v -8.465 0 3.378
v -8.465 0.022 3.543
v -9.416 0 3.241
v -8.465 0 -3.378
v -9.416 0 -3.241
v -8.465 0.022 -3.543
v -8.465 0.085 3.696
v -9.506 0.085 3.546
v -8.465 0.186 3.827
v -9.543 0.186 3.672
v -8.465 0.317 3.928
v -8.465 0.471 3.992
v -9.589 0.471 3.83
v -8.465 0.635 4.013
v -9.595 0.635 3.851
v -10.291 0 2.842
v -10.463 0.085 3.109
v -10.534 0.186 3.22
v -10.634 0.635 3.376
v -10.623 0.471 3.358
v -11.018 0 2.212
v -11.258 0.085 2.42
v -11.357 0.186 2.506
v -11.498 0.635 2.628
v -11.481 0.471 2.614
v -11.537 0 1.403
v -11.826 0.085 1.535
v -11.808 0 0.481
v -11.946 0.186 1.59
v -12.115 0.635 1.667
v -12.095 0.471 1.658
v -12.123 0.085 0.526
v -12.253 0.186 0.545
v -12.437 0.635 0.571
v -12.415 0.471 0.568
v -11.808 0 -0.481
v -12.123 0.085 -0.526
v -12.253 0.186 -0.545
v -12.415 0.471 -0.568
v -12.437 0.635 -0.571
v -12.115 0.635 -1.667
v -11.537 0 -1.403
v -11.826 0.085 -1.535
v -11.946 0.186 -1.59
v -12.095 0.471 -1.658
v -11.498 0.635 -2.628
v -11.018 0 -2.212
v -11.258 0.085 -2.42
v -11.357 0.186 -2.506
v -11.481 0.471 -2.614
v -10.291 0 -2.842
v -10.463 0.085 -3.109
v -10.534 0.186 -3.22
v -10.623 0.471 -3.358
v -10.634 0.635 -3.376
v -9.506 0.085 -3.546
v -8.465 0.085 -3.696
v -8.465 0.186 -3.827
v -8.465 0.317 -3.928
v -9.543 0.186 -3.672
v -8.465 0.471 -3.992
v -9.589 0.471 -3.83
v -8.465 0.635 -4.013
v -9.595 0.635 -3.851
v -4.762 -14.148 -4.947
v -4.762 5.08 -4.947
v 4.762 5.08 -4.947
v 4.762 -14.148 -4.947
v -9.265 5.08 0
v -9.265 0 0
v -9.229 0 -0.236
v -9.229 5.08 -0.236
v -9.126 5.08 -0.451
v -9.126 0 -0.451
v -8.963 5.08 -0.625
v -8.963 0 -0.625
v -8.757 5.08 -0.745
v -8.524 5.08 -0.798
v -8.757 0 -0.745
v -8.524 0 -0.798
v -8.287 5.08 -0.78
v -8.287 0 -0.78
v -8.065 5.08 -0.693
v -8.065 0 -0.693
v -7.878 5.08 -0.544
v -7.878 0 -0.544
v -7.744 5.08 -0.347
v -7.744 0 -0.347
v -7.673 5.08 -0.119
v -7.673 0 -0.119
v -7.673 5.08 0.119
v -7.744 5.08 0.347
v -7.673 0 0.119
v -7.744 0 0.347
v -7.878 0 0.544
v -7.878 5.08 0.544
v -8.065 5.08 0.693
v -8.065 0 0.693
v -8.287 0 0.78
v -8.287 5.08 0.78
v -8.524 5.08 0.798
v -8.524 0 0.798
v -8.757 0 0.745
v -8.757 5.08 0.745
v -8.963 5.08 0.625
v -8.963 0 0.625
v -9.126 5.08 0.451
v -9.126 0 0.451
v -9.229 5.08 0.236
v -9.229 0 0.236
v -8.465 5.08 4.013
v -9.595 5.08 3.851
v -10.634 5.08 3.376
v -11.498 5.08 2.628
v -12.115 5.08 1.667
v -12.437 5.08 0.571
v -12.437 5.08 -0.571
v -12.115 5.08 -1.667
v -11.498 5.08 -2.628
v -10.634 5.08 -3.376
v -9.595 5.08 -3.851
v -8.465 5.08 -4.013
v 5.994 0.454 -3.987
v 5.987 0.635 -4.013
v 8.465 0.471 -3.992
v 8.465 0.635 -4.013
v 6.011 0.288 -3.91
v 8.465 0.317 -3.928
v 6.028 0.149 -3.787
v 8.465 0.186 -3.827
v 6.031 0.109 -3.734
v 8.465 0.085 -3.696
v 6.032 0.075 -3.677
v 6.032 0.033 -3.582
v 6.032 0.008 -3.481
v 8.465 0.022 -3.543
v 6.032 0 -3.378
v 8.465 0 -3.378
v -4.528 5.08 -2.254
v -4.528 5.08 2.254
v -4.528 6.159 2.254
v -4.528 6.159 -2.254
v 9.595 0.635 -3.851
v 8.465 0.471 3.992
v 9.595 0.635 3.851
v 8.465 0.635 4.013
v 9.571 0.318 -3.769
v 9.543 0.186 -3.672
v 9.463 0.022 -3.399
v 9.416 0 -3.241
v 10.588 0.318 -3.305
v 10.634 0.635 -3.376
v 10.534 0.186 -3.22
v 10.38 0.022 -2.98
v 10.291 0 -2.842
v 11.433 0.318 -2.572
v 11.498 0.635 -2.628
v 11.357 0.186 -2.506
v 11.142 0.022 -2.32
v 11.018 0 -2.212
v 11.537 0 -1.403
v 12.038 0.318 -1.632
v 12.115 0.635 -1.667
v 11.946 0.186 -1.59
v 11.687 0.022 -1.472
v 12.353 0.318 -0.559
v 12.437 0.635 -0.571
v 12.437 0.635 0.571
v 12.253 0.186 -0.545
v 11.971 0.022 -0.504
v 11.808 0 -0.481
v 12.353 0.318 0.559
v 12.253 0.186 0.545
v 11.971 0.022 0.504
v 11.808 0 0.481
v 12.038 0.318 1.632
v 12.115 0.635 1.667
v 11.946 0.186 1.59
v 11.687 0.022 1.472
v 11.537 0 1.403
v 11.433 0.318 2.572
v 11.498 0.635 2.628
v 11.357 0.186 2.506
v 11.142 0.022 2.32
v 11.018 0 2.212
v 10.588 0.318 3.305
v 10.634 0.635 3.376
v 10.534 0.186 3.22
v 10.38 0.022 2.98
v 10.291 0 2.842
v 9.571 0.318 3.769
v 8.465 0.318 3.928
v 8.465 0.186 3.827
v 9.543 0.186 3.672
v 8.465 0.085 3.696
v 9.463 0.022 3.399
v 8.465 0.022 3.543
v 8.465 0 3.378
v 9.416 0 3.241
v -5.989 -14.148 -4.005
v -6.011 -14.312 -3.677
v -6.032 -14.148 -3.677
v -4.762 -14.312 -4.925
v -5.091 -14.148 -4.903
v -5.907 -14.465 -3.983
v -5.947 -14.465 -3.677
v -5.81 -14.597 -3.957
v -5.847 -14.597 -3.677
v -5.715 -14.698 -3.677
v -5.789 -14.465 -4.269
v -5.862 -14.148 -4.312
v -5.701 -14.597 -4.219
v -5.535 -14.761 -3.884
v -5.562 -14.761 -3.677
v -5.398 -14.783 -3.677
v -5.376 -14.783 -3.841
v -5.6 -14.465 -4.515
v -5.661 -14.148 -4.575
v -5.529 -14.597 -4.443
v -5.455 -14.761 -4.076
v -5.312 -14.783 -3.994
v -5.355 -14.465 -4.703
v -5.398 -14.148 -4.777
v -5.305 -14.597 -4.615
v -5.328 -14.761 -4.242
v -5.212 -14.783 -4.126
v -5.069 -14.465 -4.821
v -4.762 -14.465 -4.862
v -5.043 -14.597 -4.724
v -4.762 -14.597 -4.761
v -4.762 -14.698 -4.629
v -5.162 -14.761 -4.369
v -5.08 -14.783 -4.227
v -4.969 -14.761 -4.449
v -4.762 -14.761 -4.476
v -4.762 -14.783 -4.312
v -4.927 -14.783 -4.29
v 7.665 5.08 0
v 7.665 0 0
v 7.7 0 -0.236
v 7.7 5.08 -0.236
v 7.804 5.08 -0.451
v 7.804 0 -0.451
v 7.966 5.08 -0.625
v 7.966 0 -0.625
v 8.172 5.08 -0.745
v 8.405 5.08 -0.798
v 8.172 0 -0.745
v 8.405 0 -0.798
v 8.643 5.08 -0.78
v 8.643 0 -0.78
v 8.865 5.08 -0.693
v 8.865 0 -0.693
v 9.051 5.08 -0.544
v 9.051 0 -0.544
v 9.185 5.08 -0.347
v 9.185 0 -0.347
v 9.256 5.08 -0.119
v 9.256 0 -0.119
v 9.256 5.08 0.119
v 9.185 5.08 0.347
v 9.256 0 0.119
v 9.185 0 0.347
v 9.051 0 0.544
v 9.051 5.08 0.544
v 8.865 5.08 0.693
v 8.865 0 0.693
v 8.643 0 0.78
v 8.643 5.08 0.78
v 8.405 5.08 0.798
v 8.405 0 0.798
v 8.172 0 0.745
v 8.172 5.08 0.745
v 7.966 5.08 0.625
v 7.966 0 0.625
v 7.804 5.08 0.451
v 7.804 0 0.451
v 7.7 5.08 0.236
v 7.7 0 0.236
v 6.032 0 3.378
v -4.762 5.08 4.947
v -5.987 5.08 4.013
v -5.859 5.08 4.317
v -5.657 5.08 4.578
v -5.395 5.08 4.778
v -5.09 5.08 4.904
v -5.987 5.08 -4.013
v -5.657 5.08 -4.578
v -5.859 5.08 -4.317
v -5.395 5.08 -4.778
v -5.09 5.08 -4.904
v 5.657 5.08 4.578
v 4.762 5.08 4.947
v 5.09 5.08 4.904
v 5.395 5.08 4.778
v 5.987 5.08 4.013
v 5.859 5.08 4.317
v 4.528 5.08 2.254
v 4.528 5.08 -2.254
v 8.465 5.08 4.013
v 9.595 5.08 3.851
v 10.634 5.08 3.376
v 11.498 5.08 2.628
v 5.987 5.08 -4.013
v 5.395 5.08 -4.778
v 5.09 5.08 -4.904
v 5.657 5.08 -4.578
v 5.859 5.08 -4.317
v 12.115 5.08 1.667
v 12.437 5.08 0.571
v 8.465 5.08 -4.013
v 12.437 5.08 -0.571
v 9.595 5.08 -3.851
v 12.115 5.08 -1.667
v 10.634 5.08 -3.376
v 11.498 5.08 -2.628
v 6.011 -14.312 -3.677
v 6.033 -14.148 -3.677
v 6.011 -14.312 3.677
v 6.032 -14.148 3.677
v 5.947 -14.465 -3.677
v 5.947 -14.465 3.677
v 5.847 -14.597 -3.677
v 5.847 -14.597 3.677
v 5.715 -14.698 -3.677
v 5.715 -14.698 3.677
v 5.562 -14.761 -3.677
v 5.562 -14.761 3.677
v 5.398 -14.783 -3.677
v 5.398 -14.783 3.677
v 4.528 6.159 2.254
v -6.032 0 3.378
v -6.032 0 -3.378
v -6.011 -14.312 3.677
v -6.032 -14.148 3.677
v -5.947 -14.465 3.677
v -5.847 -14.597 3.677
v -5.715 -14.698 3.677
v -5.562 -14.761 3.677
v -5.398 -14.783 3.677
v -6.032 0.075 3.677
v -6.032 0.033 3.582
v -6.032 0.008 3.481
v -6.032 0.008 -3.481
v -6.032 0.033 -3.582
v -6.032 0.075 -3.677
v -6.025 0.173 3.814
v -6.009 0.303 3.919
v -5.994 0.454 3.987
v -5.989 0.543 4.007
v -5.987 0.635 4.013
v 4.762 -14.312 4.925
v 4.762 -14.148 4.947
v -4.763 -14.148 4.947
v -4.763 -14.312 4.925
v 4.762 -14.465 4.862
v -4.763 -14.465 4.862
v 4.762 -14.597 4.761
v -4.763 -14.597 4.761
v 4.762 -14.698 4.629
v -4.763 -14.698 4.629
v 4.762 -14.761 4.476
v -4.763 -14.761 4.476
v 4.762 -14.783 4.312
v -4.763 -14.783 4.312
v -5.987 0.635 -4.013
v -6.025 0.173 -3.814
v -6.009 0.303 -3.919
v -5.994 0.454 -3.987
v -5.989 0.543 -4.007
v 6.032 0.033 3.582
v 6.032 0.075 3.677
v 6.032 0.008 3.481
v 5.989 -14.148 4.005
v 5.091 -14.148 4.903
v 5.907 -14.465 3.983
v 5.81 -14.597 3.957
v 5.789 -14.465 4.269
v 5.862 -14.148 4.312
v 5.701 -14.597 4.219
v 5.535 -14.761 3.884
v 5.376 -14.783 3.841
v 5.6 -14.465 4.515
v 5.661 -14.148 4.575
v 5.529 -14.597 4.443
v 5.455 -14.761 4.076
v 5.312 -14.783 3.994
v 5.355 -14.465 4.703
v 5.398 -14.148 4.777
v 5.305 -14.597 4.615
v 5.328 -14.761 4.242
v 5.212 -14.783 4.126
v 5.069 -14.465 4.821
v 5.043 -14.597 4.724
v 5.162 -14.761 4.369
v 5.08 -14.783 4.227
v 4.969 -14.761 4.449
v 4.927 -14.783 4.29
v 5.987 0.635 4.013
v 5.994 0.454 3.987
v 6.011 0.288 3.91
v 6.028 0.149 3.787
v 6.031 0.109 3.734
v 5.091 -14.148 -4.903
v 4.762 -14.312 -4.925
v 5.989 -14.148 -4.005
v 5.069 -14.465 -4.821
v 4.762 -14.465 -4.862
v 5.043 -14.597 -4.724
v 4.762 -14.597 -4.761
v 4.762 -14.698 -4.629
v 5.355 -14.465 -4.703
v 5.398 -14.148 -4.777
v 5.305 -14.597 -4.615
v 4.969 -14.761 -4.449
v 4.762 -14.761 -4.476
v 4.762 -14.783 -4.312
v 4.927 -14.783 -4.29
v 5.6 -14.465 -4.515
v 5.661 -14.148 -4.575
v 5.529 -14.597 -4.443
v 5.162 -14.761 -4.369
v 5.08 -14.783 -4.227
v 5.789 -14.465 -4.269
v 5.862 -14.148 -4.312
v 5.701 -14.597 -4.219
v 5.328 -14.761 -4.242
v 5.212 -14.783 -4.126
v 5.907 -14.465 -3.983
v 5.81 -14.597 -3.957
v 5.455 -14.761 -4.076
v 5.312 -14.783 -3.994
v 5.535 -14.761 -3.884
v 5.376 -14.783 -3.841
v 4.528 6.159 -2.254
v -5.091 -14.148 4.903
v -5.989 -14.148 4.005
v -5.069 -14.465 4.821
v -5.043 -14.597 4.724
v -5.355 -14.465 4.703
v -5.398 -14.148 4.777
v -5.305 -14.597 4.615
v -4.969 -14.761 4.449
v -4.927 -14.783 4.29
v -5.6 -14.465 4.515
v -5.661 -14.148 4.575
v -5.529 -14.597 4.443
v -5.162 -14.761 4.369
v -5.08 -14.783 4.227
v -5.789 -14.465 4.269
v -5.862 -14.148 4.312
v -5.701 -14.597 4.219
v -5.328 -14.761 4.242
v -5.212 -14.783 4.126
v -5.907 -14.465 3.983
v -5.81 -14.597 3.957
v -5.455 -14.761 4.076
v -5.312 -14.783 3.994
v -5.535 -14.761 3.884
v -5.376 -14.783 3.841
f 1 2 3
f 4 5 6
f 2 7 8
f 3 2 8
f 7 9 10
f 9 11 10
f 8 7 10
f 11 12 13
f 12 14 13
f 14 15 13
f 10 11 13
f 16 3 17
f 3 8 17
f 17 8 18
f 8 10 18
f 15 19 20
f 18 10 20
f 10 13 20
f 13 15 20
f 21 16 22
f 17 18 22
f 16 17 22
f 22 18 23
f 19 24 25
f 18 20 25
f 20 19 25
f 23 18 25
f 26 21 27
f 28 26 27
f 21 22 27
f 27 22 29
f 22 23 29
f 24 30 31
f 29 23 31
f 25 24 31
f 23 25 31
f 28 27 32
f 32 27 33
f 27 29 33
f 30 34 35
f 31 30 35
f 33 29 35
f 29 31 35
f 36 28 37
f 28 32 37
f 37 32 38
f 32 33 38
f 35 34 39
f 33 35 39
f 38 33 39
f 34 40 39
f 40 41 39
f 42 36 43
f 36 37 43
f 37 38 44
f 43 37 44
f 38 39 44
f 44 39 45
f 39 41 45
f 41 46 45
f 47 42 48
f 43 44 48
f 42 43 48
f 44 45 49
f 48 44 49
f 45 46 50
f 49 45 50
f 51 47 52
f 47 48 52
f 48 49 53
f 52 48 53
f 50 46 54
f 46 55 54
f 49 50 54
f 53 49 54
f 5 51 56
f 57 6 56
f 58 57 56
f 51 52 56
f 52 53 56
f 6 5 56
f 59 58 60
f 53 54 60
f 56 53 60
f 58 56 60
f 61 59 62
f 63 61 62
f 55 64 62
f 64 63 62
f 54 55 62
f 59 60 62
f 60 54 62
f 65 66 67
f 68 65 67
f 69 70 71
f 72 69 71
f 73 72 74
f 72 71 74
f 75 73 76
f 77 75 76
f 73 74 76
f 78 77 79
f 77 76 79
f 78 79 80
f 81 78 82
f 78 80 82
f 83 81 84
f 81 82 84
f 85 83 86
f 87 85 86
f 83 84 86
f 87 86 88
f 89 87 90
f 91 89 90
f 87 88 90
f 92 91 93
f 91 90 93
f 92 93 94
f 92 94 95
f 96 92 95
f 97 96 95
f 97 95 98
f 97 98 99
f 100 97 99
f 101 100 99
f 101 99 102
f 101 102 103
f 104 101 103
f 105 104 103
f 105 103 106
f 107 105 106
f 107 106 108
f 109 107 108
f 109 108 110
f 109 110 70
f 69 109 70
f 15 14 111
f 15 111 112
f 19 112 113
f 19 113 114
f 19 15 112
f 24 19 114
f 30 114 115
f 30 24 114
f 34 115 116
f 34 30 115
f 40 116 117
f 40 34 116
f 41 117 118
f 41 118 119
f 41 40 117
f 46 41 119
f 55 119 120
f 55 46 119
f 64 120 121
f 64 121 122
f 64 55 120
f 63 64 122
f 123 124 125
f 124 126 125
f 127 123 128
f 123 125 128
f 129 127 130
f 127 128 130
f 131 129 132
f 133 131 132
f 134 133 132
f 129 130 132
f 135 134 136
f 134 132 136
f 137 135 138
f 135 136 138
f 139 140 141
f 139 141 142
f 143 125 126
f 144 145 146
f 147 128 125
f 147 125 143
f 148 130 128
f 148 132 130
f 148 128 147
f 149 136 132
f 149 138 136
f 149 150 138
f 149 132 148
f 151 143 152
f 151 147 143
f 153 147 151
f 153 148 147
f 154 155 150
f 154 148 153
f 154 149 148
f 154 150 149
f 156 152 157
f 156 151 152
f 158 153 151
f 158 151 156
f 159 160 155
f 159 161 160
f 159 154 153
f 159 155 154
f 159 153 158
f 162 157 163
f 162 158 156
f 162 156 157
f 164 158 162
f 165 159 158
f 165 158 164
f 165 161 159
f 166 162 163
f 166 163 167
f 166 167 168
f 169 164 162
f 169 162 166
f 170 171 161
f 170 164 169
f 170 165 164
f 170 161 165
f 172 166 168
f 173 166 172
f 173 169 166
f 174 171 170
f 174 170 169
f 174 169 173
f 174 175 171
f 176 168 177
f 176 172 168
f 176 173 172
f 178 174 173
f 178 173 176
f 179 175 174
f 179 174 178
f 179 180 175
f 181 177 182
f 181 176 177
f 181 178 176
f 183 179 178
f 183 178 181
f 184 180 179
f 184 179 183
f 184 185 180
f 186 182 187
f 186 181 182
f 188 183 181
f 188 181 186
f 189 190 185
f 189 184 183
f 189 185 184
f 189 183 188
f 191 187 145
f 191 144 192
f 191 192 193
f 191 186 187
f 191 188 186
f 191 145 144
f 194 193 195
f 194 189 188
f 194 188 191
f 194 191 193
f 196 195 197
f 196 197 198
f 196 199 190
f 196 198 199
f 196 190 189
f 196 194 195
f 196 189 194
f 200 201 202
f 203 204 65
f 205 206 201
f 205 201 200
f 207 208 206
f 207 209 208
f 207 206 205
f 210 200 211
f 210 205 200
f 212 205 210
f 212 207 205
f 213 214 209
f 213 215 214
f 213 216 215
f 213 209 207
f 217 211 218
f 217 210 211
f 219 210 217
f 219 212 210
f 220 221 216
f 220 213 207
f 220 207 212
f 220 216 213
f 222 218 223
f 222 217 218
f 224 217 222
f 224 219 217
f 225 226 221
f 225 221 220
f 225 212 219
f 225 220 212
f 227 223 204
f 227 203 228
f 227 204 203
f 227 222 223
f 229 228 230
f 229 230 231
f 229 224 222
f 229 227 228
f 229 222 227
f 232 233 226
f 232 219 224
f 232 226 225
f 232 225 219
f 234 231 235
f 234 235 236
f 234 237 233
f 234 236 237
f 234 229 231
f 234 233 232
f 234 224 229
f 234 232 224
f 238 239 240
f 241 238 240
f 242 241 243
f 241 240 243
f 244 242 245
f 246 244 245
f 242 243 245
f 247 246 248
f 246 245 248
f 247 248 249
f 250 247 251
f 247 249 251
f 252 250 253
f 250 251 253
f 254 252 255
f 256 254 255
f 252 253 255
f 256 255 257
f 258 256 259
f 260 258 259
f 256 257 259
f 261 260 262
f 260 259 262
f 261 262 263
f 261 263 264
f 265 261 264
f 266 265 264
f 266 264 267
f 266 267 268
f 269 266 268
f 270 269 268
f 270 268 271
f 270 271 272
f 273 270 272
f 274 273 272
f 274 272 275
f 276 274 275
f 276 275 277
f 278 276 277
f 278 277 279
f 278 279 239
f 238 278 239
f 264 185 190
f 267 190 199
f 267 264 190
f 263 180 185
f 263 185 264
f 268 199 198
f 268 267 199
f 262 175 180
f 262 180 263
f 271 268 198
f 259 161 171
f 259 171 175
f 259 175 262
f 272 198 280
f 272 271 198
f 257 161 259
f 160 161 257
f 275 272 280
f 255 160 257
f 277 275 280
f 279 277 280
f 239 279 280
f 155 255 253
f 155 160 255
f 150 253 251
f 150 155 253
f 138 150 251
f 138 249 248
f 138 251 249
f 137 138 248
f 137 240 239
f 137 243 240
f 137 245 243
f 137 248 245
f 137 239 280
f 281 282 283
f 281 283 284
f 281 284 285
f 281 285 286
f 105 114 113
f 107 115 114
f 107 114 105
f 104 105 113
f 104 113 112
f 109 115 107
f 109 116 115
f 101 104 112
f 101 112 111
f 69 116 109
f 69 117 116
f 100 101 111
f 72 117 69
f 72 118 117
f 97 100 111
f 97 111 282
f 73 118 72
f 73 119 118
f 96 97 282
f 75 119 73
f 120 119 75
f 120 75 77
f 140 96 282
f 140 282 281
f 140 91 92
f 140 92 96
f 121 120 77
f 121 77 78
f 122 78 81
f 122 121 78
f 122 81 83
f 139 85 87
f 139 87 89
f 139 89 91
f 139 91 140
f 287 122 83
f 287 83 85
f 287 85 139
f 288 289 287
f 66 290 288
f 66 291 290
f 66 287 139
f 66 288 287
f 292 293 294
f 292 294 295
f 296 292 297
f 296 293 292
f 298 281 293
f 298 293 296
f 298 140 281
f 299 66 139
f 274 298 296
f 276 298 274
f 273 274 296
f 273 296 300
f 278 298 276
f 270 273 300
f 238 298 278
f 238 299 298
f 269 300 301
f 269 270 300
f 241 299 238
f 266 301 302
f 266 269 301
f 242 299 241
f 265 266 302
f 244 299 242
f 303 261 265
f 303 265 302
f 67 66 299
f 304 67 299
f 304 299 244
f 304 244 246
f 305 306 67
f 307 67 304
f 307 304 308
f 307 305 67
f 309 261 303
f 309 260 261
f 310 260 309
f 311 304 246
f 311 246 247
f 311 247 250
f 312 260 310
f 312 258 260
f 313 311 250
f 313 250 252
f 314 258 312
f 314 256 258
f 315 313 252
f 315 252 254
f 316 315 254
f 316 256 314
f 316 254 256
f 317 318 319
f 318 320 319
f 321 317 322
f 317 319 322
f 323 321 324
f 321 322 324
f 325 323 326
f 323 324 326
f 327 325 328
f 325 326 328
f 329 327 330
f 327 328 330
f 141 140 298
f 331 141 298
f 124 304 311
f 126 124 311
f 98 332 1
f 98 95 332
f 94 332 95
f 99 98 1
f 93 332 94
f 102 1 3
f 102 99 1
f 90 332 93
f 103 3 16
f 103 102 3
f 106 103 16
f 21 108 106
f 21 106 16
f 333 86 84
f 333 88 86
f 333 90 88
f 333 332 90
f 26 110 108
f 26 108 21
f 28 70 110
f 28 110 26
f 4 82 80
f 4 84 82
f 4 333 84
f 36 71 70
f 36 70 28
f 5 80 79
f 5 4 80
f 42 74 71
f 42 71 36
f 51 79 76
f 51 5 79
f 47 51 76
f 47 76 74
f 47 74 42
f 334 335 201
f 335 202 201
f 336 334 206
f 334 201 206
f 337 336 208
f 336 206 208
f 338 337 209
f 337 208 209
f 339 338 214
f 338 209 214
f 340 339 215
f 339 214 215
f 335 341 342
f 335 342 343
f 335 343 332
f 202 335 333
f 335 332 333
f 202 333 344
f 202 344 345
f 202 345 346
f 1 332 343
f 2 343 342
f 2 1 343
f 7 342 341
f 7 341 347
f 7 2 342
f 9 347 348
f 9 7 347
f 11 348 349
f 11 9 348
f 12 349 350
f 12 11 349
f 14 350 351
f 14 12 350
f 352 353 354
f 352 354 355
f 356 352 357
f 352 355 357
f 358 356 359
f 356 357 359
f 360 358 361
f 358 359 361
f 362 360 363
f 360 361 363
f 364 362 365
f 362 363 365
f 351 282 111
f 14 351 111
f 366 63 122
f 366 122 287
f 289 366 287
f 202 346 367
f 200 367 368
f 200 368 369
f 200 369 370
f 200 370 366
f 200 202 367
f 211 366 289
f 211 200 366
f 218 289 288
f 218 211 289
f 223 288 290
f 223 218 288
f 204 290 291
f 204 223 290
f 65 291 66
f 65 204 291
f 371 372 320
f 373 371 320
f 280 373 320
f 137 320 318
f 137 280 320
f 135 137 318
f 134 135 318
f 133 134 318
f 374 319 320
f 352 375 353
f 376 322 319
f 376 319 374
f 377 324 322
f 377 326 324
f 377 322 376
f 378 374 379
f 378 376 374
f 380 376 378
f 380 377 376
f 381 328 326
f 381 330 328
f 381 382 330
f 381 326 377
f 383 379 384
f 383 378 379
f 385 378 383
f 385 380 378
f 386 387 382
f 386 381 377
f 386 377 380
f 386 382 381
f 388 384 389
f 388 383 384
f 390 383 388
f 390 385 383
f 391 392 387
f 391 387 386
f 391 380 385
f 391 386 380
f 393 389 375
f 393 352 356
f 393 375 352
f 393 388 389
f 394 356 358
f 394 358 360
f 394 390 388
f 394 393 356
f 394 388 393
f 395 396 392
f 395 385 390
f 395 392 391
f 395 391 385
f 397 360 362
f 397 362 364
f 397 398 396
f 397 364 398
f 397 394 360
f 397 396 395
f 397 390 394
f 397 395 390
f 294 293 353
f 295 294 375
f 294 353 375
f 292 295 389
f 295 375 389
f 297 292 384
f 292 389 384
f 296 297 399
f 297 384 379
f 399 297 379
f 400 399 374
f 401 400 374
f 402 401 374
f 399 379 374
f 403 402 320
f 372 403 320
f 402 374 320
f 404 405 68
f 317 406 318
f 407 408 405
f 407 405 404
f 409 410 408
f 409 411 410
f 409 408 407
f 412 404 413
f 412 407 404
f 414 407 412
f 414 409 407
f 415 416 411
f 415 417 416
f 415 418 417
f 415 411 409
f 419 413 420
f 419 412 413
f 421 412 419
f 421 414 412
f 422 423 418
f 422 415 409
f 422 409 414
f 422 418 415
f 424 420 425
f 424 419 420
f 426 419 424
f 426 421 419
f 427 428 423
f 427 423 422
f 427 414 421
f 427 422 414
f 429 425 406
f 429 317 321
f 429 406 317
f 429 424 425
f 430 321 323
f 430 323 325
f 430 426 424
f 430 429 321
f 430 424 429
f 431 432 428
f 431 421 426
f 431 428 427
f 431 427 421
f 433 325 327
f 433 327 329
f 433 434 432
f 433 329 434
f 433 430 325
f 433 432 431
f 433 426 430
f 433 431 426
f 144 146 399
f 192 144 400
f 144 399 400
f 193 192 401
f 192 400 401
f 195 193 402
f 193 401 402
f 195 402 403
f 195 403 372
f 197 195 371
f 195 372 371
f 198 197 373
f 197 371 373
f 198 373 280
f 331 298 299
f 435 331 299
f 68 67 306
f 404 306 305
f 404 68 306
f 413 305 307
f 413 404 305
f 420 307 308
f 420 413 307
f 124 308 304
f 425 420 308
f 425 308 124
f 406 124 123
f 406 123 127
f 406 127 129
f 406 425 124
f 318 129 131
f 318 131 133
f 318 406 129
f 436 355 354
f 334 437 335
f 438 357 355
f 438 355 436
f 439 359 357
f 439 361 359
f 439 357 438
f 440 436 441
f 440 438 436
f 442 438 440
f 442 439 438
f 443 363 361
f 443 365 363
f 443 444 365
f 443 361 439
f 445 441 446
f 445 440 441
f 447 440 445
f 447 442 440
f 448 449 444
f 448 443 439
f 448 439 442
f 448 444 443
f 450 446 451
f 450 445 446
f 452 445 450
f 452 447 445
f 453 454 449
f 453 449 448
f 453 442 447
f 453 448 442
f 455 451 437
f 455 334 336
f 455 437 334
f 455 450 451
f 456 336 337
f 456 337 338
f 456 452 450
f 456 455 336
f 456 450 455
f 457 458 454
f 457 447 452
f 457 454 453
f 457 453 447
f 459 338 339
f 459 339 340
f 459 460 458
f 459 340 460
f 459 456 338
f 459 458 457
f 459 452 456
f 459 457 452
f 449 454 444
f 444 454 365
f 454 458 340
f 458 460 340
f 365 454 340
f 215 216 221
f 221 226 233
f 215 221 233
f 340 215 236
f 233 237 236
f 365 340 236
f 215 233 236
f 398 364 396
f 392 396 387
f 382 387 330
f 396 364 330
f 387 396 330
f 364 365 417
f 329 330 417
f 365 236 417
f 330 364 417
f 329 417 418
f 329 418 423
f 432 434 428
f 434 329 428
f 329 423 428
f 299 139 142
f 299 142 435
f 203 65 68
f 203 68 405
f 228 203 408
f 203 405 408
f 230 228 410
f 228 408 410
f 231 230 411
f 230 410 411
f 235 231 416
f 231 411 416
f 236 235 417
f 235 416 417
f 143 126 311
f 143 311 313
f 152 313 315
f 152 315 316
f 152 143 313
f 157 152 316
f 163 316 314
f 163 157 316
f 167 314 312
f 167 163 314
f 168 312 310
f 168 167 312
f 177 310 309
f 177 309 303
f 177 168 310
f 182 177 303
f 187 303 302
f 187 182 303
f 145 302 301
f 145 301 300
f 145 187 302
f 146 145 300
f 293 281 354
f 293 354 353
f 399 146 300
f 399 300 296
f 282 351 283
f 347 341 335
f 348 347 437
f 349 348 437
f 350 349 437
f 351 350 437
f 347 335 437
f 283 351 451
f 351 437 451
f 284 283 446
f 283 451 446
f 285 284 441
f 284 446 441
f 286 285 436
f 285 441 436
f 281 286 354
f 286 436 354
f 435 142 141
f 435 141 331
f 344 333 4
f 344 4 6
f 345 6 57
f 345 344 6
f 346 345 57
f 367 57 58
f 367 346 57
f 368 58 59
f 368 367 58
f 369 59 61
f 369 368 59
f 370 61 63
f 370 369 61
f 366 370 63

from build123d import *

# Parameters (mm, degrees)
BOSS_EXTRUDE1_DEPTH   = 5.08
M2X0_4_TAPPED_HOLE1_D = 1.6
SKETCH8_W             = 12.065
SKETCH8_H             = 9.8933
BOSS_EXTRUDE2_DEPTH   = 19.8628
FILLET1_R             = 1.27
FILLET2_R             = 0.635
FILLET3_R             = 0.635
SKETCH9_W             = 9.0551
SKETCH9_H             = 4.5085
BOSS_EXTRUDE3_DEPTH   = 1.0795


with BuildPart() as part:
    # Sketch1 → Boss-Extrude1 (new body)
    with BuildSketch(Plane(origin=(0, 0, 0), x_dir=(1, 0, 0), z_dir=(0, 1, 0))):
        with BuildLine():
            Line((8.46455, -4.0132), (-8.46455, -4.0132))
            ThreePointArc((-8.46455, -4.0132), (-12.47775, 0), (-8.46455, 4.0132))
            Line((-8.46455, 4.0132), (8.46455, 4.0132))
            ThreePointArc((8.46455, 4.0132), (12.47775, 0), (8.46455, -4.0132))
        make_face()
    extrude(amount=BOSS_EXTRUDE1_DEPTH)

    # M2x0.4 Tapped Hole1 (through all)
    with Locations(Plane(origin=(0, 5.08, 0), x_dir=(1, 0, 0), z_dir=(0, 1, 0))):
        with Locations((-8.46455, 0), (8.46455, 0)):
            Hole(M2X0_4_TAPPED_HOLE1_D / 2)

    # Sketch8 → Boss-Extrude2 (add)
    with BuildSketch(Plane(origin=(0, 5.08, 0), x_dir=(1, 0, 0), z_dir=(0, 1, 0))):
        Rectangle(SKETCH8_W, SKETCH8_H)
    extrude(amount=-BOSS_EXTRUDE2_DEPTH)

    # Fillet1
    fillet1_edges = [part.edges().sort_by_distance(p)[0] for p in [
        (-6.0325, -4.8514, 4.94665),
        (6.0325, -4.8514, 4.94665),
        (-6.0325, -4.8514, -4.94665),
        (6.0325, -4.8514, -4.94665),
    ]]
    fillet(fillet1_edges, radius=FILLET1_R)

    # Fillet2
    fillet2_edges = [part.edges().sort_by_distance(p)[0] for p in [
        (-7.225822742, 0, 4.0132),
        (-12.47775, 0, 0),
        (-7.225822742, 0, -4.0132),
        (7.225822742, 0, -4.0132),
        (7.225822742, 0, 4.0132),
        (12.47775, 0, 0),
    ]]
    fillet(fillet2_edges, radius=FILLET2_R)

    # Fillet3
    fillet3_edges = [part.edges().sort_by_distance(p)[0] for p in [
        (-6.0325, -14.7828, 0),
        (0, -14.7828, 4.94665),
        (0, -14.7828, -4.94665),
        (6.0325, -14.7828, 0),
        (5.660525612, -14.7828, -4.574675612),
        (-5.660525612, -14.7828, -4.574675612),
        (5.660525612, -14.7828, 4.574675612),
        (-5.660525612, -14.7828, 4.574675612),
    ]]
    fillet(fillet3_edges, radius=FILLET3_R)

    # Sketch9 → Boss-Extrude3 (add)
    with BuildSketch(Plane(origin=(0, 5.08, 0), x_dir=(1, 0, 0), z_dir=(0, 1, 0))):
        Rectangle(SKETCH9_W, SKETCH9_H)
    extrude(amount=BOSS_EXTRUDE3_DEPTH)


solid = part.part
